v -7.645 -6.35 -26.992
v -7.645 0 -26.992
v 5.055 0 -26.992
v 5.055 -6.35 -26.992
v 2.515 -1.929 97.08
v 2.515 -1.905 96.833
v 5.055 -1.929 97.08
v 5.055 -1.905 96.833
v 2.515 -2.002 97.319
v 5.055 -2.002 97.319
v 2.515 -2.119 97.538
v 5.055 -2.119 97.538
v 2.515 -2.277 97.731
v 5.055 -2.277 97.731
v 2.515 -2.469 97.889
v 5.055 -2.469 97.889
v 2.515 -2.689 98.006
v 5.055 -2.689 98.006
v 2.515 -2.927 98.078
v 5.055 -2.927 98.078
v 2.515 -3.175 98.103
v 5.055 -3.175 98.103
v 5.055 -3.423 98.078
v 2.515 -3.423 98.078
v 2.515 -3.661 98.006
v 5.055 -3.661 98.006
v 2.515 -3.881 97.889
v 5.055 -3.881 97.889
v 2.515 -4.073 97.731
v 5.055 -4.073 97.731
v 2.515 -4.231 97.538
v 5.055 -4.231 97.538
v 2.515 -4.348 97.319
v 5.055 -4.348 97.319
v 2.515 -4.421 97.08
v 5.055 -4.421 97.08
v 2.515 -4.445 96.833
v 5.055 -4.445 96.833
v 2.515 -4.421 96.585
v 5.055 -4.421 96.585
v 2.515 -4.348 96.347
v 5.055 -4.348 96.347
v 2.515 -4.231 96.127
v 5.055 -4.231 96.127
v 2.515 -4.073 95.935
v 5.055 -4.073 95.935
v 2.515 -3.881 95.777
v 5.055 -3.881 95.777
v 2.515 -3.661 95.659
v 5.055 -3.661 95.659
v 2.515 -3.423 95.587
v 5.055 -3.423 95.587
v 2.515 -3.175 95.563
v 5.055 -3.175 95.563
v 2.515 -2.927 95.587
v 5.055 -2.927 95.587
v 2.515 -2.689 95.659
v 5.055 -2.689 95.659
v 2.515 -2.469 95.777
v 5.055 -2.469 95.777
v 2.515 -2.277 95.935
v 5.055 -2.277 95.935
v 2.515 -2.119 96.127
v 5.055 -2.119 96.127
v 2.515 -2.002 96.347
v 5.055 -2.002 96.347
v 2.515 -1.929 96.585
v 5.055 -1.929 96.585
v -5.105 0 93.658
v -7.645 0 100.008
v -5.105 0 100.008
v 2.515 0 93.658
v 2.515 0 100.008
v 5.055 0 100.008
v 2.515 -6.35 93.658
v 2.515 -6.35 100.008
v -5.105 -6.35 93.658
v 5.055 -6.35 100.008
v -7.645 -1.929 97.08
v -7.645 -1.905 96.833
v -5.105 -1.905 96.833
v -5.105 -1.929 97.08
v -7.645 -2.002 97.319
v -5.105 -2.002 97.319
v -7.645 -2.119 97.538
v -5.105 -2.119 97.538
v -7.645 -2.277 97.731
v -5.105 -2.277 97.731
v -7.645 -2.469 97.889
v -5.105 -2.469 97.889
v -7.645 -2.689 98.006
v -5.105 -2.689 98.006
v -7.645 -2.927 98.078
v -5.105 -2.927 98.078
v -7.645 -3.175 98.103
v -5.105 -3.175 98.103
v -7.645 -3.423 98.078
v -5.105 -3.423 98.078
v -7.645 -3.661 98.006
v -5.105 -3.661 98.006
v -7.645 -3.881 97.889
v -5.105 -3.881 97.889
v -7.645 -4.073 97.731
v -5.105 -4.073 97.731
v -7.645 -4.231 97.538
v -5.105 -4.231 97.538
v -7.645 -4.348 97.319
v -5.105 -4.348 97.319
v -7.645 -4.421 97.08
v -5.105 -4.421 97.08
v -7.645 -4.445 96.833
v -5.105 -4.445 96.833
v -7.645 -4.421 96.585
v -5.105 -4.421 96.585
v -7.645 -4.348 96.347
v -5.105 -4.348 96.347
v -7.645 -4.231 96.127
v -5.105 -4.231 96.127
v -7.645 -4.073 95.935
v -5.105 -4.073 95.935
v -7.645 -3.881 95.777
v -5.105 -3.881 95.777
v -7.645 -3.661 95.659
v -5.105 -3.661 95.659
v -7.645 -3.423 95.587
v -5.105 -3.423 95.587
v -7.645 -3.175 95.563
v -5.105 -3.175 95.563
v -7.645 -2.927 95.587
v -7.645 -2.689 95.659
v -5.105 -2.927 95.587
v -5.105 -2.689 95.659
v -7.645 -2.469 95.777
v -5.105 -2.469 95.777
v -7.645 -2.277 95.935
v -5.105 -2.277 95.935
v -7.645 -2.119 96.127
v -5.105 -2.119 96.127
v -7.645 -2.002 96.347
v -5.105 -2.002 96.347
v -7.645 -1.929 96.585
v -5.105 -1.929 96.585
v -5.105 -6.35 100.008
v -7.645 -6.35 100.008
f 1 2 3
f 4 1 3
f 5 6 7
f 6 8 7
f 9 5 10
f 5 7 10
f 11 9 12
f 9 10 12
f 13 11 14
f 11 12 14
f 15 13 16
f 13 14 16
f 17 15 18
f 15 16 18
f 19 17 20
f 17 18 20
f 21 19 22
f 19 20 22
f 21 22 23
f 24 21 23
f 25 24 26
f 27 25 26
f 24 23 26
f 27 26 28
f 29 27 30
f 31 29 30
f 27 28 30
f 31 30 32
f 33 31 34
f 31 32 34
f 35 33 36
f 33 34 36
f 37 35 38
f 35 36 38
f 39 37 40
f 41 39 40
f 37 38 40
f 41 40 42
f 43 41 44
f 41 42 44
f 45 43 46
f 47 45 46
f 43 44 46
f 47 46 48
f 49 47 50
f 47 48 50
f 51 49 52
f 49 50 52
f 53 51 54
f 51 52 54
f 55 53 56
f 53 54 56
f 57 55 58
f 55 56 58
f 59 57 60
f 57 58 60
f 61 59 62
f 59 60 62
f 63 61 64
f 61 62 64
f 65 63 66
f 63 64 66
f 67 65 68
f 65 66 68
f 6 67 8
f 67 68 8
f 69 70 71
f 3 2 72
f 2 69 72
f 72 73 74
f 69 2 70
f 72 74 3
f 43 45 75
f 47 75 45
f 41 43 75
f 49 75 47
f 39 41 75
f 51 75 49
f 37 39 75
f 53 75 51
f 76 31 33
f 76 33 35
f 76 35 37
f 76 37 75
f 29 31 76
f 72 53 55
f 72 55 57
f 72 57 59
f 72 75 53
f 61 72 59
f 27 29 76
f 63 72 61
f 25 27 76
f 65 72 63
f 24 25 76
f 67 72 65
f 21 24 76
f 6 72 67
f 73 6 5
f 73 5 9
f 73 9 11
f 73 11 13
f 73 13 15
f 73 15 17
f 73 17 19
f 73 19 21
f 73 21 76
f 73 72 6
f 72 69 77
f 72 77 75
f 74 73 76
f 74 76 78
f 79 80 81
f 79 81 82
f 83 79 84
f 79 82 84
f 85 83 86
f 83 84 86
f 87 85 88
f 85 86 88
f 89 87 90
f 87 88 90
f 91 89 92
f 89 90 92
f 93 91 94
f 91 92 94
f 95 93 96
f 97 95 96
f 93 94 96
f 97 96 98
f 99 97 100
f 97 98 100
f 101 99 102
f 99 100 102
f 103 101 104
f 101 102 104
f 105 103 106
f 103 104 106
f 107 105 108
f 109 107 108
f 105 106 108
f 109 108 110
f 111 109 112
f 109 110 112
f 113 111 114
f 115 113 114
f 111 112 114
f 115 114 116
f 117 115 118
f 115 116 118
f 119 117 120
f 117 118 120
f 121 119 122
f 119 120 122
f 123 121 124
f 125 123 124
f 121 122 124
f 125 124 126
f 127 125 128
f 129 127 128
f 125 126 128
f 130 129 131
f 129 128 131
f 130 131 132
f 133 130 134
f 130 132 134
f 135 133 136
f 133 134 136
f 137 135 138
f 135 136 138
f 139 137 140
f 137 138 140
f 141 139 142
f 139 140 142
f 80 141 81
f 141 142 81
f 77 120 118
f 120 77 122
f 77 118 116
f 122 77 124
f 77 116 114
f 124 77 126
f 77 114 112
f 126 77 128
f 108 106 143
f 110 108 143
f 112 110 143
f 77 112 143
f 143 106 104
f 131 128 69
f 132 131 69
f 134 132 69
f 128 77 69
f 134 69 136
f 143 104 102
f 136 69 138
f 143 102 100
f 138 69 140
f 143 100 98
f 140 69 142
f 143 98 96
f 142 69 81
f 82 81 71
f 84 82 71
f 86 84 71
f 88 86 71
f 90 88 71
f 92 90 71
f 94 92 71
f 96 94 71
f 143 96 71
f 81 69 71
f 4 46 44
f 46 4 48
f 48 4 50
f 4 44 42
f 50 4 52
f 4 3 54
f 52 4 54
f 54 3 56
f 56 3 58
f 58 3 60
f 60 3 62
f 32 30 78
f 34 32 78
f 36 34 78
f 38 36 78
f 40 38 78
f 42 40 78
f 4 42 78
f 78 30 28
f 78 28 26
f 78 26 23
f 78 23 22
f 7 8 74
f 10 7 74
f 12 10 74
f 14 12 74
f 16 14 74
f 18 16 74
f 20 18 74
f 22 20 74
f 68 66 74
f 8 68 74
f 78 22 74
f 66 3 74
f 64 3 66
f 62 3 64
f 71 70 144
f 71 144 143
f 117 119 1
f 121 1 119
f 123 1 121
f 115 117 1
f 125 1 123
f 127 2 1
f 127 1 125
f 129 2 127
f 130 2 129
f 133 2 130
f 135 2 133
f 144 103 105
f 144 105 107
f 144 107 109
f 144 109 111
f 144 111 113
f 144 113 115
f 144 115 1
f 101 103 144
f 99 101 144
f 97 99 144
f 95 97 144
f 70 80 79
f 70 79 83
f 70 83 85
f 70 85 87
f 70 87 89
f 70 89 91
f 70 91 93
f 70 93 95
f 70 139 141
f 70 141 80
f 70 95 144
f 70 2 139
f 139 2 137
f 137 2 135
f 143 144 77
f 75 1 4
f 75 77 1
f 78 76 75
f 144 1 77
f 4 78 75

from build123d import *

# Parameters (mm, degrees)
F0_W     = 12.7
F0_H     = 127
F1_DEPTH = 6.35
F2_W     = 7.62
F2_H     = 6.35
F3_DEPTH = 6.351
F4_R     = 1.27
F5_DEPTH = 12.7


with BuildPart() as f1:
    # F0 (on Front) → F1 (new body)
    with BuildSketch(Plane.XZ):
        with Locations((-1.295127, 36.507539)):
            Rectangle(F0_W, F0_H)
    extrude(amount=F1_DEPTH)

    # F2 (on Front) → F3 (cut, through all)
    with BuildSketch(Plane.XZ):
        with Locations((-1.295127, 96.832539)):
            Rectangle(F2_W, F2_H)
    extrude(amount=F3_DEPTH, mode=Mode.SUBTRACT)

    # F4 (on face) → F5 (cut, symmetric)
    with BuildSketch(Plane.YZ.offset(-5.105127)):
        with Locations((-3.175, 96.832539)):
            Circle(F4_R)
    extrude(amount=F5_DEPTH, both=True, mode=Mode.SUBTRACT)


solid = f1.part
